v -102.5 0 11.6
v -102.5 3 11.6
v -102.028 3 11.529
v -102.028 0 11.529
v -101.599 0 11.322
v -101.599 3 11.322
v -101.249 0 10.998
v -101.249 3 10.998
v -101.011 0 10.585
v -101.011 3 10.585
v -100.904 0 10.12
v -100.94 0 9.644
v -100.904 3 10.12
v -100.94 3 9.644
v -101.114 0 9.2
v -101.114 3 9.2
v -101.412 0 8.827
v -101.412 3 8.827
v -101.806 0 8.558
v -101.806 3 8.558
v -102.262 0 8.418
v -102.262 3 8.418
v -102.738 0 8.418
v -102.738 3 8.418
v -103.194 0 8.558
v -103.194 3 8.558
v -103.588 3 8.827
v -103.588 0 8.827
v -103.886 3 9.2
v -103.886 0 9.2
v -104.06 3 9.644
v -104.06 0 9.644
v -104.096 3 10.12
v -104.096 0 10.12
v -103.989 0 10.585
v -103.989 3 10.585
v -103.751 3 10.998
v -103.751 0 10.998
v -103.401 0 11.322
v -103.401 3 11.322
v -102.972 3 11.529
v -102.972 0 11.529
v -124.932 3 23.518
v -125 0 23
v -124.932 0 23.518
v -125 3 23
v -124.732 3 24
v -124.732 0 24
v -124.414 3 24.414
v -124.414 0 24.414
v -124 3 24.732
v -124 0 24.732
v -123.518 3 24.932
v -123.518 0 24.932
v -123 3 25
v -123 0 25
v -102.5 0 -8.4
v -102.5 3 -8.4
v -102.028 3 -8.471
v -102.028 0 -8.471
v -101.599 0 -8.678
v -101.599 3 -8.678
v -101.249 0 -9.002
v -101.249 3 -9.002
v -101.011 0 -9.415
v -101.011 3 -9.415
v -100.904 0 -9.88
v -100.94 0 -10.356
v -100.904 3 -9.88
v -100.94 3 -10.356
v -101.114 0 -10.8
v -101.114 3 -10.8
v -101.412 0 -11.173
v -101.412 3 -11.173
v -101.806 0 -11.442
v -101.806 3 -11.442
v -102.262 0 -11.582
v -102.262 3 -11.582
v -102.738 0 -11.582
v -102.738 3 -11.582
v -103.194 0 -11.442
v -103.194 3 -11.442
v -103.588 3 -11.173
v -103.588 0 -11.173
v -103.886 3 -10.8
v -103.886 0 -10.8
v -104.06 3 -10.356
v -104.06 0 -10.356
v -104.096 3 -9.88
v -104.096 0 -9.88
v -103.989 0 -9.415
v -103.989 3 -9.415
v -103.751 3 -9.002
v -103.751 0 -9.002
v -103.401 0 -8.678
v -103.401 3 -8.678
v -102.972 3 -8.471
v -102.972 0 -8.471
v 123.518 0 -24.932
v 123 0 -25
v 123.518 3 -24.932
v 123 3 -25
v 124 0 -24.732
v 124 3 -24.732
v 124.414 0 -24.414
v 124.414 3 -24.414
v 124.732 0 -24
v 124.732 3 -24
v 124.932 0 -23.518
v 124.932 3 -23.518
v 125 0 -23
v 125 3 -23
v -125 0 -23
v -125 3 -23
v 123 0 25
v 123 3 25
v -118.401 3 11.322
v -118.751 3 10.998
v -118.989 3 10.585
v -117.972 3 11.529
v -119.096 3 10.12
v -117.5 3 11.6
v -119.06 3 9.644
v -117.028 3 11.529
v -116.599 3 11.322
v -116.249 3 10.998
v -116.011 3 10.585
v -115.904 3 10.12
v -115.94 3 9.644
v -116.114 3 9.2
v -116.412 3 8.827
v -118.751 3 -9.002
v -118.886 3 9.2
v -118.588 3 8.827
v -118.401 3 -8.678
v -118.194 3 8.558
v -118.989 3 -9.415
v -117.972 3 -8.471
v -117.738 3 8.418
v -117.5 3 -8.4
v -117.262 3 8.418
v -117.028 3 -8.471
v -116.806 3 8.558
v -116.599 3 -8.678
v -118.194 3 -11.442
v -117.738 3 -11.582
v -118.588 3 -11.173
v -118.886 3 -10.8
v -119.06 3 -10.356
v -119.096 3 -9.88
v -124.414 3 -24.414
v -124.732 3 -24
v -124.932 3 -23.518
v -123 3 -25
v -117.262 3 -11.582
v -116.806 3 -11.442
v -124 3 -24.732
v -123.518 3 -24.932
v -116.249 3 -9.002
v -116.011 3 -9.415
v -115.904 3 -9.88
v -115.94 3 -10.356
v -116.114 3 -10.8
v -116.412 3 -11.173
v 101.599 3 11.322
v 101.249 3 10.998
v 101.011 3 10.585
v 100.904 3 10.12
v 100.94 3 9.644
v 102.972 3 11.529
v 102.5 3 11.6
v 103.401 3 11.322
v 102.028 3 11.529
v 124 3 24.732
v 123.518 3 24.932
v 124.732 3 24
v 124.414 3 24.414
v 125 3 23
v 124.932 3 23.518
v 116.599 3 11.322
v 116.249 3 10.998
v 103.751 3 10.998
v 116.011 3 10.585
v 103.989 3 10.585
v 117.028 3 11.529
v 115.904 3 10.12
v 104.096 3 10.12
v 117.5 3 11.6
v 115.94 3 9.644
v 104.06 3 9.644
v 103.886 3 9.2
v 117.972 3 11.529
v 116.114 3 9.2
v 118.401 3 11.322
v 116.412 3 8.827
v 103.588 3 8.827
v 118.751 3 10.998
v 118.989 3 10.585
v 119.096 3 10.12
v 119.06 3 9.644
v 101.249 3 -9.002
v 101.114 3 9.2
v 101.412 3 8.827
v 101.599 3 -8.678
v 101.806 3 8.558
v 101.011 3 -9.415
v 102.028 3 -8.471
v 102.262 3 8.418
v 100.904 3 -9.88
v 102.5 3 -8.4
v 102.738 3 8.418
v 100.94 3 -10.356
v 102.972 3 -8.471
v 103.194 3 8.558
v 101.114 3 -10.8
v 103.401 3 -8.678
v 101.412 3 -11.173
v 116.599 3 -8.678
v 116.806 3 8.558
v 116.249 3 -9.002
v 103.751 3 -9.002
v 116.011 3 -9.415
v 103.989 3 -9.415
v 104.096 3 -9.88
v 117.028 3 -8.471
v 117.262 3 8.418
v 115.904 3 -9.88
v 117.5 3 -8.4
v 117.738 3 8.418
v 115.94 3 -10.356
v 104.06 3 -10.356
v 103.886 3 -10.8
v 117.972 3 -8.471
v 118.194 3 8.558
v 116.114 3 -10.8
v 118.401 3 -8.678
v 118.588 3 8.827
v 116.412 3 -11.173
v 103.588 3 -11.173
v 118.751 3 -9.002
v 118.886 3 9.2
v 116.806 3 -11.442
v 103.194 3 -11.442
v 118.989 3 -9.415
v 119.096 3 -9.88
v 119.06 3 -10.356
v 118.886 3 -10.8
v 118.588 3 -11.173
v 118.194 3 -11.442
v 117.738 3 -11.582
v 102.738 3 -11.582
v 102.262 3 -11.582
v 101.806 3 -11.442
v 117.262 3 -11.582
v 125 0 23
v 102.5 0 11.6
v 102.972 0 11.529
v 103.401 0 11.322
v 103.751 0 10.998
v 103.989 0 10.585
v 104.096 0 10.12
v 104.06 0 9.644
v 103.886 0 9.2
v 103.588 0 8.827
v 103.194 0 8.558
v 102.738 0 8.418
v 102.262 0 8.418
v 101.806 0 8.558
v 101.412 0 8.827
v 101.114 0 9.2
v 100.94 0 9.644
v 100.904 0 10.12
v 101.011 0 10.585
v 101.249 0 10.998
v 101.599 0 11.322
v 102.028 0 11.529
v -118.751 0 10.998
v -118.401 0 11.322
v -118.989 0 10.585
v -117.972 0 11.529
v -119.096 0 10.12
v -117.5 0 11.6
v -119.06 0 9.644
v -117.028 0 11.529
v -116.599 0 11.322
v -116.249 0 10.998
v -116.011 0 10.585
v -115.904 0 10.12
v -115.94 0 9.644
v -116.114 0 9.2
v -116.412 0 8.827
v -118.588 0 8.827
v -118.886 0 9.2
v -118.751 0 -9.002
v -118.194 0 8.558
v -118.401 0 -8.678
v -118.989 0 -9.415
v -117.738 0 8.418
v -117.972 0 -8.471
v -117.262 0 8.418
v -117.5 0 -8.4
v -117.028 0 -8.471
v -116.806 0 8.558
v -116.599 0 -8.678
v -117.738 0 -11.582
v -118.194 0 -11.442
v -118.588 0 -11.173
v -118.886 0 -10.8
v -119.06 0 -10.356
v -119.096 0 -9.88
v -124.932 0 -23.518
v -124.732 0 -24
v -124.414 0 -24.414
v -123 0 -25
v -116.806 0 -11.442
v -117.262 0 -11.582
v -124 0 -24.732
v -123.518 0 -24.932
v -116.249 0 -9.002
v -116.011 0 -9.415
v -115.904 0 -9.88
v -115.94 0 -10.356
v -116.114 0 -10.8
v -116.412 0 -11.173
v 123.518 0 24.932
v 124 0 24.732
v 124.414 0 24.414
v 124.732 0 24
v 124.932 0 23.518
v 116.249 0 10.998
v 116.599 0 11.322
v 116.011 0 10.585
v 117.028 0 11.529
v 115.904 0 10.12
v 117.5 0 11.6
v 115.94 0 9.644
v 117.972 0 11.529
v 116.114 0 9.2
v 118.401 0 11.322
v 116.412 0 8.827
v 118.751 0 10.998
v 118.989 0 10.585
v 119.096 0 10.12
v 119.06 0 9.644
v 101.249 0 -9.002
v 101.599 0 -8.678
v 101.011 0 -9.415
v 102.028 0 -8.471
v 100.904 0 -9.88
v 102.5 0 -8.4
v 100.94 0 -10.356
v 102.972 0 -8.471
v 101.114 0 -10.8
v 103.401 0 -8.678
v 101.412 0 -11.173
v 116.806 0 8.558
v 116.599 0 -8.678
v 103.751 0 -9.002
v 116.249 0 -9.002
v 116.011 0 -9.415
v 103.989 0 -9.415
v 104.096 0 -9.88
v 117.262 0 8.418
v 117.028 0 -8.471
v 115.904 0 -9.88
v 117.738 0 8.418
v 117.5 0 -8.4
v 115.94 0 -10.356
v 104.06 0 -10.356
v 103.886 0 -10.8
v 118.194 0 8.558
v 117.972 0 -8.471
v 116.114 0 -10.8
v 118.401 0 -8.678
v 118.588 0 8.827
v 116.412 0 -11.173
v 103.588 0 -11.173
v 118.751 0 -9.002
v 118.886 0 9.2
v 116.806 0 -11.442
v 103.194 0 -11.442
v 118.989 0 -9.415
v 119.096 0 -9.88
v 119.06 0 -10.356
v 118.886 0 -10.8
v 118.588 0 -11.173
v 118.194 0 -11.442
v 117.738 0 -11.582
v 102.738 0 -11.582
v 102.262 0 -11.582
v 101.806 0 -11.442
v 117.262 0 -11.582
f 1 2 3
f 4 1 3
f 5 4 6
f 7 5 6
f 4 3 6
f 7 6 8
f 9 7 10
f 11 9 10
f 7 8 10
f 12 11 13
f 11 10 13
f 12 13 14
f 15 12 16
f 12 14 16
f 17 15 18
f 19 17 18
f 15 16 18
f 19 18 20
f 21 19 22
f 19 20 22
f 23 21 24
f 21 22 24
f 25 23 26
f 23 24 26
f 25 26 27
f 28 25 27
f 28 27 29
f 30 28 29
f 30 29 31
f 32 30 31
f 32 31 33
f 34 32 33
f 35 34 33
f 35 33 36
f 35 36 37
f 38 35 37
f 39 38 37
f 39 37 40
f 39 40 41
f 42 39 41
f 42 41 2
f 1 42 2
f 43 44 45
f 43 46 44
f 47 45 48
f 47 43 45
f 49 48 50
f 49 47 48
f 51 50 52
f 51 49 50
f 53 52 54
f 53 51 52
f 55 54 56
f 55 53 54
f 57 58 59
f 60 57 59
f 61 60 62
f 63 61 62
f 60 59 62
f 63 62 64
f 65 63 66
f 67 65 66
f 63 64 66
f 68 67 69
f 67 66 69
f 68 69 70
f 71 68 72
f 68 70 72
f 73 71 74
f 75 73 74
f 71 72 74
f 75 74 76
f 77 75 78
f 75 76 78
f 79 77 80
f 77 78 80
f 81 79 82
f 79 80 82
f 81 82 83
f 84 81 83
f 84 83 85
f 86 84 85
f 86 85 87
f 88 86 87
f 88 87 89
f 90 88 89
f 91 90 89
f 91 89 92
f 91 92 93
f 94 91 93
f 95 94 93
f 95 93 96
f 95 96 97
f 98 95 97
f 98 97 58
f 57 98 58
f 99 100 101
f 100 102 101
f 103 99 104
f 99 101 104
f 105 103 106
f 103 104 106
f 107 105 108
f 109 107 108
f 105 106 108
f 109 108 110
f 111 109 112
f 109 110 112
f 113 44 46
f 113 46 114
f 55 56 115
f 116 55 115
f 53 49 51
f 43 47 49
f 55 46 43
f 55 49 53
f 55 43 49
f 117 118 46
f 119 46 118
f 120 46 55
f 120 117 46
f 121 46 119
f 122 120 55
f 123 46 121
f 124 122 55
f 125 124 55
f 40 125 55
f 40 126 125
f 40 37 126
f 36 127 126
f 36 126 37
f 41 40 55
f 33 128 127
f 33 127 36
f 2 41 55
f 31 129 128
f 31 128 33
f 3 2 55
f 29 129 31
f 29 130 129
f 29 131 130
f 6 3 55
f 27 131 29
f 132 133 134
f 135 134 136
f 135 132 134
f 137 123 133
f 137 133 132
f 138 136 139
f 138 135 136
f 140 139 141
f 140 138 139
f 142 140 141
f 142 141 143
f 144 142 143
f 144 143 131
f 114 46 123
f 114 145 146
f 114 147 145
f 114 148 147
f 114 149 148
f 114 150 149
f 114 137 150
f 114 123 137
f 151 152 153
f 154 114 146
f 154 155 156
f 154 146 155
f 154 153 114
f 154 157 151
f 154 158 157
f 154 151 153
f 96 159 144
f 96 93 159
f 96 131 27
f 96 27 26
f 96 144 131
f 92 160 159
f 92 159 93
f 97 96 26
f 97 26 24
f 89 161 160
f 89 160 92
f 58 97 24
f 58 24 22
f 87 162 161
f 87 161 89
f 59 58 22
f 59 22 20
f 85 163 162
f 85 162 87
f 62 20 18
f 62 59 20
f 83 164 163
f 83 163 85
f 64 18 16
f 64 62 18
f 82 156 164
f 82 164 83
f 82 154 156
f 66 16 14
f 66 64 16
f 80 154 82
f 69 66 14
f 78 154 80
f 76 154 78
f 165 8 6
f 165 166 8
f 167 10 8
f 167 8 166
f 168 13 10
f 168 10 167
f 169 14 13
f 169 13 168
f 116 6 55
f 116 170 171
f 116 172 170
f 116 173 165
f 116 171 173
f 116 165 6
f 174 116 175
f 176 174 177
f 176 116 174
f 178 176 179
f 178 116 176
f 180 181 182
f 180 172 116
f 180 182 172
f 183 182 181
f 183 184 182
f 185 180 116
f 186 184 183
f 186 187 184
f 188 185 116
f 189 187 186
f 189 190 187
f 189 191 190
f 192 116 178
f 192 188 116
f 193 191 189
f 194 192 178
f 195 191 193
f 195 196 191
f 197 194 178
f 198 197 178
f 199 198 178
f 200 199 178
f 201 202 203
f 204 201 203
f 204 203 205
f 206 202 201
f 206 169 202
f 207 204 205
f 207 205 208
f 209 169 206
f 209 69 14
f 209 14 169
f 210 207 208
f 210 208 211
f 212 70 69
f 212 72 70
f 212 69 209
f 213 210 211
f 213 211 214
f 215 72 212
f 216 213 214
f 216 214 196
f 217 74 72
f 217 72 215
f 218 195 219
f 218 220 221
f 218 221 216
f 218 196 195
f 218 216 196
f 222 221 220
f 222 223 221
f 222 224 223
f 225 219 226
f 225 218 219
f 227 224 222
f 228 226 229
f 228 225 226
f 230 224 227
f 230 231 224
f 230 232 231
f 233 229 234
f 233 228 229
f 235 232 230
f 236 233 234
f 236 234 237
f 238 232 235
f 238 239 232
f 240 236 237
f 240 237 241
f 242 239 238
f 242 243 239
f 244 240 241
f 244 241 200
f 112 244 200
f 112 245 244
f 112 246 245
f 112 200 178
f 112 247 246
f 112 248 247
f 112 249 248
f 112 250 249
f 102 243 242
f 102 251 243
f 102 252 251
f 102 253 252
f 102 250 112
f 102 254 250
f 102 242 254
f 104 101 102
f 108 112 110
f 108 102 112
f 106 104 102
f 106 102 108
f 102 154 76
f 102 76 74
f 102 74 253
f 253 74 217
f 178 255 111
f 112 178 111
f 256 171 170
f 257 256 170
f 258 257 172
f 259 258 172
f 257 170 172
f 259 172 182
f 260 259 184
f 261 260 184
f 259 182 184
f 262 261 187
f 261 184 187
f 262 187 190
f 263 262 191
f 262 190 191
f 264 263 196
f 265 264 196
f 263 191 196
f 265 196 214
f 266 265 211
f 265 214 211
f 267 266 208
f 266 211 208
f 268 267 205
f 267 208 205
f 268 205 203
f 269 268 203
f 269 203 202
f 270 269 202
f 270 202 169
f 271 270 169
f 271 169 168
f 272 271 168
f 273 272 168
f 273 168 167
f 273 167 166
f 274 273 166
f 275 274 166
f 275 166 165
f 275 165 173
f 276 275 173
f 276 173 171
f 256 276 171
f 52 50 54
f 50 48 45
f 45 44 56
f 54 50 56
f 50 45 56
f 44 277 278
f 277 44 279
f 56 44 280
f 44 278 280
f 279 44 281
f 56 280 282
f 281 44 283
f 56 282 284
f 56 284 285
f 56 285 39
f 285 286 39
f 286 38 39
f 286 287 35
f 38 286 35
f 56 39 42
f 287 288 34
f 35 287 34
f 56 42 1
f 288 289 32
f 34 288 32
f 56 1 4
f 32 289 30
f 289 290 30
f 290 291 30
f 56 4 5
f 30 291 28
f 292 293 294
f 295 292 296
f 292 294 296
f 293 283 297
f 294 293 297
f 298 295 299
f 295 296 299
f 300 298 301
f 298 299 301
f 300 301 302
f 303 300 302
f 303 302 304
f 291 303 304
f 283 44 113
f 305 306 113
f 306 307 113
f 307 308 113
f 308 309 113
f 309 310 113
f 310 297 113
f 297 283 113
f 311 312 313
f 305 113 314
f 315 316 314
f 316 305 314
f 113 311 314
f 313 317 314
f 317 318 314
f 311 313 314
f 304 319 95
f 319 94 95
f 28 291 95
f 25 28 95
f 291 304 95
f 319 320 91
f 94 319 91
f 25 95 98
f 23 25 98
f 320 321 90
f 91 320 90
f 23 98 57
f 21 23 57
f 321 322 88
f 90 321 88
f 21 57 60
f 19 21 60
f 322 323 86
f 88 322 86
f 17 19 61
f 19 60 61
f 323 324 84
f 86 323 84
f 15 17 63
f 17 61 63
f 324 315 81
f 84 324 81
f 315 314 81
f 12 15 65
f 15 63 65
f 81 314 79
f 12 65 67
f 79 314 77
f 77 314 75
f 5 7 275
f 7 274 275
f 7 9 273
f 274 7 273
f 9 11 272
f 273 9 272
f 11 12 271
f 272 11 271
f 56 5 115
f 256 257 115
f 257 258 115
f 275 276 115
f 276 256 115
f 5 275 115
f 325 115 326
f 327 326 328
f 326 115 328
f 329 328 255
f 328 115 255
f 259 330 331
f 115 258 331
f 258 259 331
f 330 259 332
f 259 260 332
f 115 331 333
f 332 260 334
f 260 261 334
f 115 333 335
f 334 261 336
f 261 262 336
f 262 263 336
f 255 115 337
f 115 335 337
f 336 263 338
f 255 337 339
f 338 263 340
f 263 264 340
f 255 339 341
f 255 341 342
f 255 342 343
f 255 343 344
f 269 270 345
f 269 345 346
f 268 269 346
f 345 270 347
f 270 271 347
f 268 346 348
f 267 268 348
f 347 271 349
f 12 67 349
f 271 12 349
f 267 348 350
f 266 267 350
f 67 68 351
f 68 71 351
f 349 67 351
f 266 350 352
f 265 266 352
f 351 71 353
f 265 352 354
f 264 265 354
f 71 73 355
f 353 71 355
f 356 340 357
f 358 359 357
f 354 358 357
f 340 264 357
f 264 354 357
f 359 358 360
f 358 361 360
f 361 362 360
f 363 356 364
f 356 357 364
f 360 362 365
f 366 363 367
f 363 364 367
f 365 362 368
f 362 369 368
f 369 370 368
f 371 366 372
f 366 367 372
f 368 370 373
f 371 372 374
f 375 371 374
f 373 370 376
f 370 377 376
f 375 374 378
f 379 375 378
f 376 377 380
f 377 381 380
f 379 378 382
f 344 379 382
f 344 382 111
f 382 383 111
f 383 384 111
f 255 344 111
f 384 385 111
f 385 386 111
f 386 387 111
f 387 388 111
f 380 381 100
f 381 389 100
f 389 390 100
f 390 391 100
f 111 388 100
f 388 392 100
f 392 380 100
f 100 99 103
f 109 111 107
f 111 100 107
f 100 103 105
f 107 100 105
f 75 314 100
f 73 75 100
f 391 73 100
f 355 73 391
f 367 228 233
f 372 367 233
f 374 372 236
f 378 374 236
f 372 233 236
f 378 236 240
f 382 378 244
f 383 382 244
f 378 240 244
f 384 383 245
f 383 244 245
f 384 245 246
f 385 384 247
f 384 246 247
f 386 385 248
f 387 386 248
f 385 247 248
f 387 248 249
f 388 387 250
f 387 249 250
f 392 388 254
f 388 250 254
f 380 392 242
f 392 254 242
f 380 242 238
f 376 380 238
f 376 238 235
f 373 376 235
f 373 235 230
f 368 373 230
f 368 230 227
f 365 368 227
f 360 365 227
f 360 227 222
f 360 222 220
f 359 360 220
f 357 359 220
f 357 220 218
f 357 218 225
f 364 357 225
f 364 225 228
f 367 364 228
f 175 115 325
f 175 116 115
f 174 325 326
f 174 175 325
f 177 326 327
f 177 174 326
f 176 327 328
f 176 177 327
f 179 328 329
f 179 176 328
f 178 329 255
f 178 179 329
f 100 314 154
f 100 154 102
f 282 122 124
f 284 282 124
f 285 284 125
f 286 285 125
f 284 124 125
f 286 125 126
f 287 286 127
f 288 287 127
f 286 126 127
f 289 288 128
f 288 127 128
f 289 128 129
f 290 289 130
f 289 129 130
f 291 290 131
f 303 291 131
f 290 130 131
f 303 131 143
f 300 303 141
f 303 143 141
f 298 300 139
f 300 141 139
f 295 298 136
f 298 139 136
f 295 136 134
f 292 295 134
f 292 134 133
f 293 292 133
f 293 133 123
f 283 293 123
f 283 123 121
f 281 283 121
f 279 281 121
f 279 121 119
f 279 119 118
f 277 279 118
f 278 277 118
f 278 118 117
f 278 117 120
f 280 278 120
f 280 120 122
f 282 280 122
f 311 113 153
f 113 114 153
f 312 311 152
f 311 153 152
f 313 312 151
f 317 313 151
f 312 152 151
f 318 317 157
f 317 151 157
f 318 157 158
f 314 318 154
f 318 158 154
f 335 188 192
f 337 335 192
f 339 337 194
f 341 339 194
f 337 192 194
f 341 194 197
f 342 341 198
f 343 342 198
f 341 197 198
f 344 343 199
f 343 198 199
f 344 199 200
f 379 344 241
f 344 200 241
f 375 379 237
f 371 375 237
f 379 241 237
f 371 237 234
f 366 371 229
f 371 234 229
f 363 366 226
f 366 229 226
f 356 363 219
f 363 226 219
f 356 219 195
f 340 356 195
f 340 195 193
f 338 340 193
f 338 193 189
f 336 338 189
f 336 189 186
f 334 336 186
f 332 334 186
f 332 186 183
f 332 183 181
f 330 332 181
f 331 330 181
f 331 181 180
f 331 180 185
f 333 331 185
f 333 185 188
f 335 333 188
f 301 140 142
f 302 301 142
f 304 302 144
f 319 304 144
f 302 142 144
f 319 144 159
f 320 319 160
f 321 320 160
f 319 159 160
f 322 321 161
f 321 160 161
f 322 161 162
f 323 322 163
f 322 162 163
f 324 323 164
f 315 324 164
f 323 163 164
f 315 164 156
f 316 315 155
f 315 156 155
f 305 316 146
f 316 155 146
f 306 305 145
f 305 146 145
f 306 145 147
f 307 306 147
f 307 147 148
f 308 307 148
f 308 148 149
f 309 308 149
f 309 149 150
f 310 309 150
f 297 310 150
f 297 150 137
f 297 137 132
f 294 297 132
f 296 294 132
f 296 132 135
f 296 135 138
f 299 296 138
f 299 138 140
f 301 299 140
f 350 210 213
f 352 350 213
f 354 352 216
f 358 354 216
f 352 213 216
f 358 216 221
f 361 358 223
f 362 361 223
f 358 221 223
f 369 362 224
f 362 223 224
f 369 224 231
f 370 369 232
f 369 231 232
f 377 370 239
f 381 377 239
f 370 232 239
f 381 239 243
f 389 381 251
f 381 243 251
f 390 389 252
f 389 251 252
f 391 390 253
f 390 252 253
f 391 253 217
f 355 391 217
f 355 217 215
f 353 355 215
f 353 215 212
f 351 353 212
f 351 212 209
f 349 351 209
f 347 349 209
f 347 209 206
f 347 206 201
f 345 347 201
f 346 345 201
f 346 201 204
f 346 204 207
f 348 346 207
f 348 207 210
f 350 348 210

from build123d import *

# Parameters (mm, degrees)
SKETCH_1_W          = 250
SKETCH_1_H          = 50
EXTRUDE_1_DEPTH     = 3
CUT_EXTRUDE_1_REACH = 129.511
SKETCH_3_R          = 1.6
FILLET_1_R          = 2


with BuildPart() as part:
    # 草图1 → 凸台-拉伸1 (new body)
    with BuildSketch(Plane(origin=(0, 0, 0), x_dir=(1, 0, 0), z_dir=(0, 1, 0))):
        Rectangle(SKETCH_1_W, SKETCH_1_H)
    extrude(amount=EXTRUDE_1_DEPTH)

    # 草图3 → 切除-拉伸1 (cut, up to next)
    with BuildSketch(Plane(origin=(0, 3, 0), x_dir=(1, 0, 0), z_dir=(0, 1, 0)), mode=Mode.PRIVATE) as cut_extrude_1_sk1:
        with Locations(Location((-117.5, 10, 0), (0, 0, 270))):
            Circle(SKETCH_3_R)
    cut_extrude_1_tool1 = extrude(cut_extrude_1_sk1.sketch, amount=-CUT_EXTRUDE_1_REACH, mode=Mode.PRIVATE) & part.part
    # 草图3 → 切除-拉伸1 (cut, up to next)
    with BuildSketch(Plane(origin=(0, 3, 0), x_dir=(1, 0, 0), z_dir=(0, 1, 0)), mode=Mode.PRIVATE) as cut_extrude_1_sk2:
        with Locations(Location((-102.5, 10, 0), (0, 0, 270))):
            Circle(SKETCH_3_R)
    cut_extrude_1_tool2 = extrude(cut_extrude_1_sk2.sketch, amount=-CUT_EXTRUDE_1_REACH, mode=Mode.PRIVATE) & part.part
    # 草图3 → 切除-拉伸1 (cut, up to next)
    with BuildSketch(Plane(origin=(0, 3, 0), x_dir=(1, 0, 0), z_dir=(0, 1, 0)), mode=Mode.PRIVATE) as cut_extrude_1_sk3:
        with Locations(Location((-102.5, -10, 0), (0, 0, 270))):
            Circle(SKETCH_3_R)
    cut_extrude_1_tool3 = extrude(cut_extrude_1_sk3.sketch, amount=-CUT_EXTRUDE_1_REACH, mode=Mode.PRIVATE) & part.part
    # 草图3 → 切除-拉伸1 (cut, up to next)
    with BuildSketch(Plane(origin=(0, 3, 0), x_dir=(1, 0, 0), z_dir=(0, 1, 0)), mode=Mode.PRIVATE) as cut_extrude_1_sk4:
        with Locations(Location((-117.5, -10, 0), (0, 0, 270))):
            Circle(SKETCH_3_R)
    cut_extrude_1_tool4 = extrude(cut_extrude_1_sk4.sketch, amount=-CUT_EXTRUDE_1_REACH, mode=Mode.PRIVATE) & part.part
    # 草图3 → 切除-拉伸1 (cut, up to next)
    with BuildSketch(Plane(origin=(0, 3, 0), x_dir=(1, 0, 0), z_dir=(0, 1, 0)), mode=Mode.PRIVATE) as cut_extrude_1_sk5:
        with Locations(Location((117.5, -10, 0), (0, 0, 270))):
            Circle(SKETCH_3_R)
    cut_extrude_1_tool5 = extrude(cut_extrude_1_sk5.sketch, amount=-CUT_EXTRUDE_1_REACH, mode=Mode.PRIVATE) & part.part
    # 草图3 → 切除-拉伸1 (cut, up to next)
    with BuildSketch(Plane(origin=(0, 3, 0), x_dir=(1, 0, 0), z_dir=(0, 1, 0)), mode=Mode.PRIVATE) as cut_extrude_1_sk6:
        with Locations(Location((102.5, 10, 0), (0, 0, 270))):
            Circle(SKETCH_3_R)
    cut_extrude_1_tool6 = extrude(cut_extrude_1_sk6.sketch, amount=-CUT_EXTRUDE_1_REACH, mode=Mode.PRIVATE) & part.part
    # 草图3 → 切除-拉伸1 (cut, up to next)
    with BuildSketch(Plane(origin=(0, 3, 0), x_dir=(1, 0, 0), z_dir=(0, 1, 0)), mode=Mode.PRIVATE) as cut_extrude_1_sk7:
        with Locations(Location((117.5, 10, 0), (0, 0, 270))):
            Circle(SKETCH_3_R)
    cut_extrude_1_tool7 = extrude(cut_extrude_1_sk7.sketch, amount=-CUT_EXTRUDE_1_REACH, mode=Mode.PRIVATE) & part.part
    # 草图3 → 切除-拉伸1 (cut, up to next)
    with BuildSketch(Plane(origin=(0, 3, 0), x_dir=(1, 0, 0), z_dir=(0, 1, 0)), mode=Mode.PRIVATE) as cut_extrude_1_sk8:
        with Locations(Location((102.5, -10, 0), (0, 0, 270))):
            Circle(SKETCH_3_R)
    cut_extrude_1_tool8 = extrude(cut_extrude_1_sk8.sketch, amount=-CUT_EXTRUDE_1_REACH, mode=Mode.PRIVATE) & part.part
    add(cut_extrude_1_tool1.solids().sort_by_distance((-117.5, 3, -10))[0], mode=Mode.SUBTRACT)
    add(cut_extrude_1_tool2.solids().sort_by_distance((-102.5, 3, -10))[0], mode=Mode.SUBTRACT)
    add(cut_extrude_1_tool3.solids().sort_by_distance((-102.5, 3, 10))[0], mode=Mode.SUBTRACT)
    add(cut_extrude_1_tool4.solids().sort_by_distance((-117.5, 3, 10))[0], mode=Mode.SUBTRACT)
    add(cut_extrude_1_tool5.solids().sort_by_distance((117.5, 3, 10))[0], mode=Mode.SUBTRACT)
    add(cut_extrude_1_tool6.solids().sort_by_distance((102.5, 3, -10))[0], mode=Mode.SUBTRACT)
    add(cut_extrude_1_tool7.solids().sort_by_distance((117.5, 3, -10))[0], mode=Mode.SUBTRACT)
    add(cut_extrude_1_tool8.solids().sort_by_distance((102.5, 3, 10))[0], mode=Mode.SUBTRACT)

    # 圆角1
    fillet_1_edges = [part.edges().sort_by_distance(p)[0] for p in [
        (125, 1.5, 25),
        (-125, 1.5, 25),
        (-125, 1.5, -25),
        (125, 1.5, -25),
    ]]
    fillet(fillet_1_edges, radius=FILLET_1_R)


solid = part.part
